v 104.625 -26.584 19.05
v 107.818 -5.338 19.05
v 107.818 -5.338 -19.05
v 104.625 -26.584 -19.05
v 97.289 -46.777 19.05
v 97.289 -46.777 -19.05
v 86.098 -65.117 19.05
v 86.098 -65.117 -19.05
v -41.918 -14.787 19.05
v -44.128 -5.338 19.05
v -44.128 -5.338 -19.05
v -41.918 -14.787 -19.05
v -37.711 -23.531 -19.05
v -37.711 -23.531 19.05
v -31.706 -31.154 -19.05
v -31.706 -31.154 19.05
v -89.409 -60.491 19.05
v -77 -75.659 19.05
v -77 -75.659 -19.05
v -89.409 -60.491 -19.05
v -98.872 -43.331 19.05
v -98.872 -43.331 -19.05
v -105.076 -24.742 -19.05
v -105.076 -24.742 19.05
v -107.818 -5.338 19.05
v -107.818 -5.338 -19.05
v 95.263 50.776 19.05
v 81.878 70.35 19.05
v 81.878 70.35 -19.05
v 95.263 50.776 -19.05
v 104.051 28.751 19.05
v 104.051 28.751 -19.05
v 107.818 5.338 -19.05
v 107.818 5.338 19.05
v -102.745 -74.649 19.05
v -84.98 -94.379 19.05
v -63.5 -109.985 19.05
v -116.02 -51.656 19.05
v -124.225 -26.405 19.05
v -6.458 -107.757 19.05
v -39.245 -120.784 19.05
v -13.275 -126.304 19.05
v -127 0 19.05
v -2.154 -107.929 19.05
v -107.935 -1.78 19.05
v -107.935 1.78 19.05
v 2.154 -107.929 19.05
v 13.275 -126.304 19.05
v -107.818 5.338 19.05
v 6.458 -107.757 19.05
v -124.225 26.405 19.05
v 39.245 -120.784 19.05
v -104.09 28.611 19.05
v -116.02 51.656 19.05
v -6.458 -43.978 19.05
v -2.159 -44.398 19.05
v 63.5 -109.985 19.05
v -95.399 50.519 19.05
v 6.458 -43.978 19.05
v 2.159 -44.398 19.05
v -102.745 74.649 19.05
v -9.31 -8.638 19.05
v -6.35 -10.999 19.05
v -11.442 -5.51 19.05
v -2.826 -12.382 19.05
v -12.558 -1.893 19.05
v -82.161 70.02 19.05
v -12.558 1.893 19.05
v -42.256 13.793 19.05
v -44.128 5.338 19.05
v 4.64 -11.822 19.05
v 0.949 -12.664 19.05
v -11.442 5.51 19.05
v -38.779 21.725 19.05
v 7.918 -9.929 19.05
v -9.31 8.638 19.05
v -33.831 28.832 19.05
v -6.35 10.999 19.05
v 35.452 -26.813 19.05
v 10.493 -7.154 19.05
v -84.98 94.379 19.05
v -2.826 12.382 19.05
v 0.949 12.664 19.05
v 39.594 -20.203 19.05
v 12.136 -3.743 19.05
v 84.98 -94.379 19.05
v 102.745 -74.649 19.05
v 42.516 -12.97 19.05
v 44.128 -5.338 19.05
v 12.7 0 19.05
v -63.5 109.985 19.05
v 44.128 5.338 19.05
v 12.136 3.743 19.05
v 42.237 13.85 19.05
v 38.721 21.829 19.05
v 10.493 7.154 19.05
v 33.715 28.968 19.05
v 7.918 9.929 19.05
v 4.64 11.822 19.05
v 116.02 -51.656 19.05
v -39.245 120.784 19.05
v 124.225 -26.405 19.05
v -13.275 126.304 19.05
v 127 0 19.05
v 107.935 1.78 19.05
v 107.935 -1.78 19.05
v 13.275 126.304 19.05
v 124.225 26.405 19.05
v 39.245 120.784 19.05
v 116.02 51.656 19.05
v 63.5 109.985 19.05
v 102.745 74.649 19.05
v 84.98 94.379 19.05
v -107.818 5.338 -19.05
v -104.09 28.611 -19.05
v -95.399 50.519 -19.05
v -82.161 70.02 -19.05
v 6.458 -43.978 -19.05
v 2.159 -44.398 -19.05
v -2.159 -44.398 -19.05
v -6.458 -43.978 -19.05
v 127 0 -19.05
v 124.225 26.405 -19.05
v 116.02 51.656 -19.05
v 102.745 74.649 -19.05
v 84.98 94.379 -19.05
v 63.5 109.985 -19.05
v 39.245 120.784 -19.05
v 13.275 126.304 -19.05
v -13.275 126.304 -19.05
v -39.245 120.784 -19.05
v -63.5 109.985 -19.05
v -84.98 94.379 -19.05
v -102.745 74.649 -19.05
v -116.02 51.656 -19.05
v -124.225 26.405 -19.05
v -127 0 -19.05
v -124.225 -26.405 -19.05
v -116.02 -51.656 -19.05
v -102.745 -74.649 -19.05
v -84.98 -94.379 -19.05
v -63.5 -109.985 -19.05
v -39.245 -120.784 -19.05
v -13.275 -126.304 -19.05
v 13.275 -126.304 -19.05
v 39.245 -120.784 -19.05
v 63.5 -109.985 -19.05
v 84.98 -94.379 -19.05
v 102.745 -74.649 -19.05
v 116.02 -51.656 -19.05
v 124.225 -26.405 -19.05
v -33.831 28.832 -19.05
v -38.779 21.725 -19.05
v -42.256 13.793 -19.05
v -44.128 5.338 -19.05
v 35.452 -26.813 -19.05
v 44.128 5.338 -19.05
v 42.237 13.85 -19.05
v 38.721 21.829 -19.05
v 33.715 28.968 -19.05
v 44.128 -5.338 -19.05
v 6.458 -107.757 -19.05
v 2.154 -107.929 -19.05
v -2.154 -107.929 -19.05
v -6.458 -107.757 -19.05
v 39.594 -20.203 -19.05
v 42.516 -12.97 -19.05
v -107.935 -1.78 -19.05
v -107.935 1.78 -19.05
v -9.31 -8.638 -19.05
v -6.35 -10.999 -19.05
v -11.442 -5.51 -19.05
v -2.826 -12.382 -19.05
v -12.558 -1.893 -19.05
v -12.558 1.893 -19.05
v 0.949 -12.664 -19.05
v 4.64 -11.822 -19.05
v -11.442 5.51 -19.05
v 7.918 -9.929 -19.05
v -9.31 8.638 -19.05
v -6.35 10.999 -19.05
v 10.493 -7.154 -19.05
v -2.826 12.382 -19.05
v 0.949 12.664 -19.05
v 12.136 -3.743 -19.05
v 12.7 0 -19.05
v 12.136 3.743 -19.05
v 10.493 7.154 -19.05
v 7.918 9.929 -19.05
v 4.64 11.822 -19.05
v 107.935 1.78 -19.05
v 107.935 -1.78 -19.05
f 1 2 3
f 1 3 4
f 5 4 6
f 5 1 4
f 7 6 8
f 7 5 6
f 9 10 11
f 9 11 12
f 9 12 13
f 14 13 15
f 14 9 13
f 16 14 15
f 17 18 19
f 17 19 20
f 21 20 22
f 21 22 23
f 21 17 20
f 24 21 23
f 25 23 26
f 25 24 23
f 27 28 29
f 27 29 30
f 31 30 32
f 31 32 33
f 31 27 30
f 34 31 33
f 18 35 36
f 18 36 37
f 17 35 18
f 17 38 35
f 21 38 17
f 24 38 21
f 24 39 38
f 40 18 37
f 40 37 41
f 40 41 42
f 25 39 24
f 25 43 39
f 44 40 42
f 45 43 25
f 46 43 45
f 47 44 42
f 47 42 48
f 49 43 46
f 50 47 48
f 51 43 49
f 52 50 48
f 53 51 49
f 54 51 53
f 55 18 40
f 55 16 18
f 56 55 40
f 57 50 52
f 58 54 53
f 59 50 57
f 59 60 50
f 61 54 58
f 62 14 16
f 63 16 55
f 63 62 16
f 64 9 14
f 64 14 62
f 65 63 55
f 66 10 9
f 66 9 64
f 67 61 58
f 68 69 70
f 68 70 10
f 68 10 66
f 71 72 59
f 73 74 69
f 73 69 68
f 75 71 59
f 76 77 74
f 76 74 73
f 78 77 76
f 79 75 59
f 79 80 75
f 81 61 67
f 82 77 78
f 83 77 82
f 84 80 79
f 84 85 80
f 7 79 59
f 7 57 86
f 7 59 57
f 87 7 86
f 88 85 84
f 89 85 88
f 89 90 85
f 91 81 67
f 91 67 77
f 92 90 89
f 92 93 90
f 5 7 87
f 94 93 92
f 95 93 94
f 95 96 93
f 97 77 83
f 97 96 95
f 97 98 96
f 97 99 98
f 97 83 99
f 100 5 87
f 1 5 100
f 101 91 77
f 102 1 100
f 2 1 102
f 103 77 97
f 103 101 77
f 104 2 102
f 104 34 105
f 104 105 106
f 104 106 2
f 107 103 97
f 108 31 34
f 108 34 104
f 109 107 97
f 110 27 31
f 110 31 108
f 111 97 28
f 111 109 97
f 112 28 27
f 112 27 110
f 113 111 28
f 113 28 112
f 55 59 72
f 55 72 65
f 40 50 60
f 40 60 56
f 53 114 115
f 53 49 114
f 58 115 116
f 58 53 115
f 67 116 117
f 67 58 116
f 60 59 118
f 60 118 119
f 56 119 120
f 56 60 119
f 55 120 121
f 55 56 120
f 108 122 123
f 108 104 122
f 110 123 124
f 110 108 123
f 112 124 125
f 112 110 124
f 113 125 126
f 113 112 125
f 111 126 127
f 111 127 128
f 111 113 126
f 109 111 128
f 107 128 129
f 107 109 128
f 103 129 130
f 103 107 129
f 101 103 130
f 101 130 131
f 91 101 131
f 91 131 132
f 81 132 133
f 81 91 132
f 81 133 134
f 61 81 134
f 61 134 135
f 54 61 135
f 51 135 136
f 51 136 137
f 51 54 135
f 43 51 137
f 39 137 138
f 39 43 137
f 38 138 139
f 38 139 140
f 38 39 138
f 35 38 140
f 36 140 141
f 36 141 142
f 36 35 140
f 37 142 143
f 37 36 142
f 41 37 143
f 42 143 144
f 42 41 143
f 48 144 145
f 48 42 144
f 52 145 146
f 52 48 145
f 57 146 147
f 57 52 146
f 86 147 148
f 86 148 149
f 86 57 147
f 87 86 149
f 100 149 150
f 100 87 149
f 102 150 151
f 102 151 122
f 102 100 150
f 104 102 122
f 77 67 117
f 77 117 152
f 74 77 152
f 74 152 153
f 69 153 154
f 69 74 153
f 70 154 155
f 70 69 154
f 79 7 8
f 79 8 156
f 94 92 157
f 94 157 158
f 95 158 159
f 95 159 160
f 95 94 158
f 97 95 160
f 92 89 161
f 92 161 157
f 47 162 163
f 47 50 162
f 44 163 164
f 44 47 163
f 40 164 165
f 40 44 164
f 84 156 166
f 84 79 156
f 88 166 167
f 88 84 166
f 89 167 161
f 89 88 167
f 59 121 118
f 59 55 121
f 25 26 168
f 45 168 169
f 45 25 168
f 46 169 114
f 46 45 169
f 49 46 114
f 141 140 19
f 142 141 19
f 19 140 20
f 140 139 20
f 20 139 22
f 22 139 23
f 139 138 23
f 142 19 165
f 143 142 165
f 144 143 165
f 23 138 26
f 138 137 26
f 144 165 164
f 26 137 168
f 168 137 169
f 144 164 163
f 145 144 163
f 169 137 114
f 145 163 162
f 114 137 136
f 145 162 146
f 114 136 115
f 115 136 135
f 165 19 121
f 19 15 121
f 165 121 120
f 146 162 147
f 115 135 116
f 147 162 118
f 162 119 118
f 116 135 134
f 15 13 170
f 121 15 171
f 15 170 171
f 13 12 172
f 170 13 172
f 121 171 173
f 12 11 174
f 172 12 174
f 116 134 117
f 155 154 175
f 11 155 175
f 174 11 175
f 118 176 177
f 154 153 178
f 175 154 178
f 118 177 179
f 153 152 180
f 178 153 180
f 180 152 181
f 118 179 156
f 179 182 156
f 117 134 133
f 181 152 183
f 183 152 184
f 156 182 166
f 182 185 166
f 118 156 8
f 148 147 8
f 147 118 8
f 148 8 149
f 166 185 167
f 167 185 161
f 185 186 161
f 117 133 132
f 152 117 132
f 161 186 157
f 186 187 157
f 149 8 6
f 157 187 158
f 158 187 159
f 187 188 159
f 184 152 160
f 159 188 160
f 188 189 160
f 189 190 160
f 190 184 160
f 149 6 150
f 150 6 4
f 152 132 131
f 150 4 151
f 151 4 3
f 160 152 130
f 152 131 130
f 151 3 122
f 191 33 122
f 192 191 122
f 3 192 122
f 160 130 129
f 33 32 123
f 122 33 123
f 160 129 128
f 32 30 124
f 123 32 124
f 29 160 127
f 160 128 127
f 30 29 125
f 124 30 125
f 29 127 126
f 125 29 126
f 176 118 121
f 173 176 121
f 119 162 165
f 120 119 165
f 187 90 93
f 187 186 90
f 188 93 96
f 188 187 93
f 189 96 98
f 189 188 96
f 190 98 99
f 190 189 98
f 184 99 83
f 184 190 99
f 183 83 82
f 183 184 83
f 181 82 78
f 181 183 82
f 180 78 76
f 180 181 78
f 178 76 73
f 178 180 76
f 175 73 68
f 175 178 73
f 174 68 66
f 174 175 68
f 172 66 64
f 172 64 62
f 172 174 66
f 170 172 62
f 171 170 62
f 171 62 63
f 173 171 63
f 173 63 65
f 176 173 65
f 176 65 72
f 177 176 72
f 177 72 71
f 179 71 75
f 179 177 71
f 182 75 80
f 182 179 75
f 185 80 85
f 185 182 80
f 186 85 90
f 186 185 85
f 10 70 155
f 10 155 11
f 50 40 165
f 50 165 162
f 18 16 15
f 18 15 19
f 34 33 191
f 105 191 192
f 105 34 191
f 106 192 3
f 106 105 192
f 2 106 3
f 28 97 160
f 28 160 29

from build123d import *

# Parameters (mm, degrees)
F0_R     = 127
F0_R_2   = 12.7
F1_DEPTH = 19.05


with BuildPart() as f1:
    # F0 (on Top) → F1 (new body, symmetric)
    with BuildSketch(Plane.XY):
        Circle(F0_R)
        with BuildLine():
            ThreePointArc((-82.161109, 70.019674), (-48.159661, 96.61185), (-6.457917, 107.75666))
            Line((-6.457917, 107.75666), (6.457917, 107.75666))
            ThreePointArc((6.457917, 107.75666), (47.964828, 96.708726), (81.878172, 70.350319))
            ThreePointArc((81.878172, 70.350319), (100.263633, 40.00508), (107.81793, 5.338218))
            ThreePointArc((107.81793, 5.338218), (107.95, 0), (107.81793, -5.338218))
            ThreePointArc((107.81793, -5.338218), (101.460657, -36.86377), (86.098285, -65.117492))
            ThreePointArc((86.098285, -65.117492), (50.952795, -95.168352), (6.457917, -107.75666))
            ThreePointArc((6.457917, -107.75666), (0, -107.95), (-6.457917, -107.75666))
            ThreePointArc((-6.457917, -107.75666), (-44.708732, -98.256459), (-76.999847, -75.658616))
            ThreePointArc((-76.999847, -75.658616), (-98.871847, -43.330824), (-107.81793, -5.338218))
            ThreePointArc((-107.81793, -5.338218), (-107.95, 0), (-107.81793, 5.338218))
            ThreePointArc((-107.81793, 5.338218), (-100.344065, 39.802903), (-82.161109, 70.019674))
        make_face(mode=Mode.SUBTRACT)
        with BuildLine():
            ThreePointArc((-6.457917, 43.978379), (-21.521062, 38.892755), (-33.831045, 28.83163))
            ThreePointArc((-33.831045, 28.83163), (-40.711172, 17.843849), (-44.128289, 5.338218))
            Line((-44.128289, 5.338218), (-44.128289, -5.338218))
            ThreePointArc((-44.128289, -5.338218), (-40.053849, -19.274119), (-31.705819, -31.153548))
            ThreePointArc((-31.705819, -31.153548), (-20.130494, -39.630364), (-6.457917, -43.978379))
            Line((-6.457917, -43.978379), (6.457917, -43.978379))
            ThreePointArc((6.457917, -43.978379), (22.644581, -38.249516), (35.452235, -26.813085))
            ThreePointArc((35.452235, -26.813085), (41.213559, -16.650677), (44.128289, -5.338218))
            Line((44.128289, -5.338218), (44.128289, 5.338218))
            ThreePointArc((44.128289, 5.338218), (40.675123, 17.925872), (33.714542, 28.967779))
            ThreePointArc((33.714542, 28.967779), (21.442625, 38.936055), (6.457917, 43.978379))
            Line((6.457917, 43.978379), (-6.457917, 43.978379))
        make_face()
        Circle(F0_R_2, mode=Mode.SUBTRACT)
        with BuildLine():
            Line((6.457917, 107.75666), (-6.457917, 107.75666))
            ThreePointArc((-6.457917, 107.75666), (-48.159661, 96.61185), (-82.161109, 70.019674))
            Line((-82.161109, 70.019674), (-33.831045, 28.83163))
            ThreePointArc((-33.831045, 28.83163), (-21.521062, 38.892755), (-6.457917, 43.978379))
            Line((-6.457917, 43.978379), (6.457917, 43.978379))
            ThreePointArc((6.457917, 43.978379), (21.442625, 38.936055), (33.714542, 28.967779))
            Line((33.714542, 28.967779), (81.878172, 70.350319))
            ThreePointArc((81.878172, 70.350319), (47.964828, 96.708726), (6.457917, 107.75666))
        make_face()
        with BuildLine():
            Line((-31.705819, -31.153548), (-76.999847, -75.658616))
            ThreePointArc((-76.999847, -75.658616), (-44.708732, -98.256459), (-6.457917, -107.75666))
            Line((-6.457917, -107.75666), (6.457917, -107.75666))
            ThreePointArc((6.457917, -107.75666), (50.952795, -95.168352), (86.098285, -65.117492))
            Line((86.098285, -65.117492), (35.452235, -26.813085))
            ThreePointArc((35.452235, -26.813085), (22.644581, -38.249516), (6.457917, -43.978379))
            ThreePointArc((6.457917, -43.978379), (0, -44.45), (-6.457917, -43.978379))
            ThreePointArc((-6.457917, -43.978379), (-20.130494, -39.630364), (-31.705819, -31.153548))
        make_face()
    extrude(amount=F1_DEPTH, both=True)


solid = f1.part
